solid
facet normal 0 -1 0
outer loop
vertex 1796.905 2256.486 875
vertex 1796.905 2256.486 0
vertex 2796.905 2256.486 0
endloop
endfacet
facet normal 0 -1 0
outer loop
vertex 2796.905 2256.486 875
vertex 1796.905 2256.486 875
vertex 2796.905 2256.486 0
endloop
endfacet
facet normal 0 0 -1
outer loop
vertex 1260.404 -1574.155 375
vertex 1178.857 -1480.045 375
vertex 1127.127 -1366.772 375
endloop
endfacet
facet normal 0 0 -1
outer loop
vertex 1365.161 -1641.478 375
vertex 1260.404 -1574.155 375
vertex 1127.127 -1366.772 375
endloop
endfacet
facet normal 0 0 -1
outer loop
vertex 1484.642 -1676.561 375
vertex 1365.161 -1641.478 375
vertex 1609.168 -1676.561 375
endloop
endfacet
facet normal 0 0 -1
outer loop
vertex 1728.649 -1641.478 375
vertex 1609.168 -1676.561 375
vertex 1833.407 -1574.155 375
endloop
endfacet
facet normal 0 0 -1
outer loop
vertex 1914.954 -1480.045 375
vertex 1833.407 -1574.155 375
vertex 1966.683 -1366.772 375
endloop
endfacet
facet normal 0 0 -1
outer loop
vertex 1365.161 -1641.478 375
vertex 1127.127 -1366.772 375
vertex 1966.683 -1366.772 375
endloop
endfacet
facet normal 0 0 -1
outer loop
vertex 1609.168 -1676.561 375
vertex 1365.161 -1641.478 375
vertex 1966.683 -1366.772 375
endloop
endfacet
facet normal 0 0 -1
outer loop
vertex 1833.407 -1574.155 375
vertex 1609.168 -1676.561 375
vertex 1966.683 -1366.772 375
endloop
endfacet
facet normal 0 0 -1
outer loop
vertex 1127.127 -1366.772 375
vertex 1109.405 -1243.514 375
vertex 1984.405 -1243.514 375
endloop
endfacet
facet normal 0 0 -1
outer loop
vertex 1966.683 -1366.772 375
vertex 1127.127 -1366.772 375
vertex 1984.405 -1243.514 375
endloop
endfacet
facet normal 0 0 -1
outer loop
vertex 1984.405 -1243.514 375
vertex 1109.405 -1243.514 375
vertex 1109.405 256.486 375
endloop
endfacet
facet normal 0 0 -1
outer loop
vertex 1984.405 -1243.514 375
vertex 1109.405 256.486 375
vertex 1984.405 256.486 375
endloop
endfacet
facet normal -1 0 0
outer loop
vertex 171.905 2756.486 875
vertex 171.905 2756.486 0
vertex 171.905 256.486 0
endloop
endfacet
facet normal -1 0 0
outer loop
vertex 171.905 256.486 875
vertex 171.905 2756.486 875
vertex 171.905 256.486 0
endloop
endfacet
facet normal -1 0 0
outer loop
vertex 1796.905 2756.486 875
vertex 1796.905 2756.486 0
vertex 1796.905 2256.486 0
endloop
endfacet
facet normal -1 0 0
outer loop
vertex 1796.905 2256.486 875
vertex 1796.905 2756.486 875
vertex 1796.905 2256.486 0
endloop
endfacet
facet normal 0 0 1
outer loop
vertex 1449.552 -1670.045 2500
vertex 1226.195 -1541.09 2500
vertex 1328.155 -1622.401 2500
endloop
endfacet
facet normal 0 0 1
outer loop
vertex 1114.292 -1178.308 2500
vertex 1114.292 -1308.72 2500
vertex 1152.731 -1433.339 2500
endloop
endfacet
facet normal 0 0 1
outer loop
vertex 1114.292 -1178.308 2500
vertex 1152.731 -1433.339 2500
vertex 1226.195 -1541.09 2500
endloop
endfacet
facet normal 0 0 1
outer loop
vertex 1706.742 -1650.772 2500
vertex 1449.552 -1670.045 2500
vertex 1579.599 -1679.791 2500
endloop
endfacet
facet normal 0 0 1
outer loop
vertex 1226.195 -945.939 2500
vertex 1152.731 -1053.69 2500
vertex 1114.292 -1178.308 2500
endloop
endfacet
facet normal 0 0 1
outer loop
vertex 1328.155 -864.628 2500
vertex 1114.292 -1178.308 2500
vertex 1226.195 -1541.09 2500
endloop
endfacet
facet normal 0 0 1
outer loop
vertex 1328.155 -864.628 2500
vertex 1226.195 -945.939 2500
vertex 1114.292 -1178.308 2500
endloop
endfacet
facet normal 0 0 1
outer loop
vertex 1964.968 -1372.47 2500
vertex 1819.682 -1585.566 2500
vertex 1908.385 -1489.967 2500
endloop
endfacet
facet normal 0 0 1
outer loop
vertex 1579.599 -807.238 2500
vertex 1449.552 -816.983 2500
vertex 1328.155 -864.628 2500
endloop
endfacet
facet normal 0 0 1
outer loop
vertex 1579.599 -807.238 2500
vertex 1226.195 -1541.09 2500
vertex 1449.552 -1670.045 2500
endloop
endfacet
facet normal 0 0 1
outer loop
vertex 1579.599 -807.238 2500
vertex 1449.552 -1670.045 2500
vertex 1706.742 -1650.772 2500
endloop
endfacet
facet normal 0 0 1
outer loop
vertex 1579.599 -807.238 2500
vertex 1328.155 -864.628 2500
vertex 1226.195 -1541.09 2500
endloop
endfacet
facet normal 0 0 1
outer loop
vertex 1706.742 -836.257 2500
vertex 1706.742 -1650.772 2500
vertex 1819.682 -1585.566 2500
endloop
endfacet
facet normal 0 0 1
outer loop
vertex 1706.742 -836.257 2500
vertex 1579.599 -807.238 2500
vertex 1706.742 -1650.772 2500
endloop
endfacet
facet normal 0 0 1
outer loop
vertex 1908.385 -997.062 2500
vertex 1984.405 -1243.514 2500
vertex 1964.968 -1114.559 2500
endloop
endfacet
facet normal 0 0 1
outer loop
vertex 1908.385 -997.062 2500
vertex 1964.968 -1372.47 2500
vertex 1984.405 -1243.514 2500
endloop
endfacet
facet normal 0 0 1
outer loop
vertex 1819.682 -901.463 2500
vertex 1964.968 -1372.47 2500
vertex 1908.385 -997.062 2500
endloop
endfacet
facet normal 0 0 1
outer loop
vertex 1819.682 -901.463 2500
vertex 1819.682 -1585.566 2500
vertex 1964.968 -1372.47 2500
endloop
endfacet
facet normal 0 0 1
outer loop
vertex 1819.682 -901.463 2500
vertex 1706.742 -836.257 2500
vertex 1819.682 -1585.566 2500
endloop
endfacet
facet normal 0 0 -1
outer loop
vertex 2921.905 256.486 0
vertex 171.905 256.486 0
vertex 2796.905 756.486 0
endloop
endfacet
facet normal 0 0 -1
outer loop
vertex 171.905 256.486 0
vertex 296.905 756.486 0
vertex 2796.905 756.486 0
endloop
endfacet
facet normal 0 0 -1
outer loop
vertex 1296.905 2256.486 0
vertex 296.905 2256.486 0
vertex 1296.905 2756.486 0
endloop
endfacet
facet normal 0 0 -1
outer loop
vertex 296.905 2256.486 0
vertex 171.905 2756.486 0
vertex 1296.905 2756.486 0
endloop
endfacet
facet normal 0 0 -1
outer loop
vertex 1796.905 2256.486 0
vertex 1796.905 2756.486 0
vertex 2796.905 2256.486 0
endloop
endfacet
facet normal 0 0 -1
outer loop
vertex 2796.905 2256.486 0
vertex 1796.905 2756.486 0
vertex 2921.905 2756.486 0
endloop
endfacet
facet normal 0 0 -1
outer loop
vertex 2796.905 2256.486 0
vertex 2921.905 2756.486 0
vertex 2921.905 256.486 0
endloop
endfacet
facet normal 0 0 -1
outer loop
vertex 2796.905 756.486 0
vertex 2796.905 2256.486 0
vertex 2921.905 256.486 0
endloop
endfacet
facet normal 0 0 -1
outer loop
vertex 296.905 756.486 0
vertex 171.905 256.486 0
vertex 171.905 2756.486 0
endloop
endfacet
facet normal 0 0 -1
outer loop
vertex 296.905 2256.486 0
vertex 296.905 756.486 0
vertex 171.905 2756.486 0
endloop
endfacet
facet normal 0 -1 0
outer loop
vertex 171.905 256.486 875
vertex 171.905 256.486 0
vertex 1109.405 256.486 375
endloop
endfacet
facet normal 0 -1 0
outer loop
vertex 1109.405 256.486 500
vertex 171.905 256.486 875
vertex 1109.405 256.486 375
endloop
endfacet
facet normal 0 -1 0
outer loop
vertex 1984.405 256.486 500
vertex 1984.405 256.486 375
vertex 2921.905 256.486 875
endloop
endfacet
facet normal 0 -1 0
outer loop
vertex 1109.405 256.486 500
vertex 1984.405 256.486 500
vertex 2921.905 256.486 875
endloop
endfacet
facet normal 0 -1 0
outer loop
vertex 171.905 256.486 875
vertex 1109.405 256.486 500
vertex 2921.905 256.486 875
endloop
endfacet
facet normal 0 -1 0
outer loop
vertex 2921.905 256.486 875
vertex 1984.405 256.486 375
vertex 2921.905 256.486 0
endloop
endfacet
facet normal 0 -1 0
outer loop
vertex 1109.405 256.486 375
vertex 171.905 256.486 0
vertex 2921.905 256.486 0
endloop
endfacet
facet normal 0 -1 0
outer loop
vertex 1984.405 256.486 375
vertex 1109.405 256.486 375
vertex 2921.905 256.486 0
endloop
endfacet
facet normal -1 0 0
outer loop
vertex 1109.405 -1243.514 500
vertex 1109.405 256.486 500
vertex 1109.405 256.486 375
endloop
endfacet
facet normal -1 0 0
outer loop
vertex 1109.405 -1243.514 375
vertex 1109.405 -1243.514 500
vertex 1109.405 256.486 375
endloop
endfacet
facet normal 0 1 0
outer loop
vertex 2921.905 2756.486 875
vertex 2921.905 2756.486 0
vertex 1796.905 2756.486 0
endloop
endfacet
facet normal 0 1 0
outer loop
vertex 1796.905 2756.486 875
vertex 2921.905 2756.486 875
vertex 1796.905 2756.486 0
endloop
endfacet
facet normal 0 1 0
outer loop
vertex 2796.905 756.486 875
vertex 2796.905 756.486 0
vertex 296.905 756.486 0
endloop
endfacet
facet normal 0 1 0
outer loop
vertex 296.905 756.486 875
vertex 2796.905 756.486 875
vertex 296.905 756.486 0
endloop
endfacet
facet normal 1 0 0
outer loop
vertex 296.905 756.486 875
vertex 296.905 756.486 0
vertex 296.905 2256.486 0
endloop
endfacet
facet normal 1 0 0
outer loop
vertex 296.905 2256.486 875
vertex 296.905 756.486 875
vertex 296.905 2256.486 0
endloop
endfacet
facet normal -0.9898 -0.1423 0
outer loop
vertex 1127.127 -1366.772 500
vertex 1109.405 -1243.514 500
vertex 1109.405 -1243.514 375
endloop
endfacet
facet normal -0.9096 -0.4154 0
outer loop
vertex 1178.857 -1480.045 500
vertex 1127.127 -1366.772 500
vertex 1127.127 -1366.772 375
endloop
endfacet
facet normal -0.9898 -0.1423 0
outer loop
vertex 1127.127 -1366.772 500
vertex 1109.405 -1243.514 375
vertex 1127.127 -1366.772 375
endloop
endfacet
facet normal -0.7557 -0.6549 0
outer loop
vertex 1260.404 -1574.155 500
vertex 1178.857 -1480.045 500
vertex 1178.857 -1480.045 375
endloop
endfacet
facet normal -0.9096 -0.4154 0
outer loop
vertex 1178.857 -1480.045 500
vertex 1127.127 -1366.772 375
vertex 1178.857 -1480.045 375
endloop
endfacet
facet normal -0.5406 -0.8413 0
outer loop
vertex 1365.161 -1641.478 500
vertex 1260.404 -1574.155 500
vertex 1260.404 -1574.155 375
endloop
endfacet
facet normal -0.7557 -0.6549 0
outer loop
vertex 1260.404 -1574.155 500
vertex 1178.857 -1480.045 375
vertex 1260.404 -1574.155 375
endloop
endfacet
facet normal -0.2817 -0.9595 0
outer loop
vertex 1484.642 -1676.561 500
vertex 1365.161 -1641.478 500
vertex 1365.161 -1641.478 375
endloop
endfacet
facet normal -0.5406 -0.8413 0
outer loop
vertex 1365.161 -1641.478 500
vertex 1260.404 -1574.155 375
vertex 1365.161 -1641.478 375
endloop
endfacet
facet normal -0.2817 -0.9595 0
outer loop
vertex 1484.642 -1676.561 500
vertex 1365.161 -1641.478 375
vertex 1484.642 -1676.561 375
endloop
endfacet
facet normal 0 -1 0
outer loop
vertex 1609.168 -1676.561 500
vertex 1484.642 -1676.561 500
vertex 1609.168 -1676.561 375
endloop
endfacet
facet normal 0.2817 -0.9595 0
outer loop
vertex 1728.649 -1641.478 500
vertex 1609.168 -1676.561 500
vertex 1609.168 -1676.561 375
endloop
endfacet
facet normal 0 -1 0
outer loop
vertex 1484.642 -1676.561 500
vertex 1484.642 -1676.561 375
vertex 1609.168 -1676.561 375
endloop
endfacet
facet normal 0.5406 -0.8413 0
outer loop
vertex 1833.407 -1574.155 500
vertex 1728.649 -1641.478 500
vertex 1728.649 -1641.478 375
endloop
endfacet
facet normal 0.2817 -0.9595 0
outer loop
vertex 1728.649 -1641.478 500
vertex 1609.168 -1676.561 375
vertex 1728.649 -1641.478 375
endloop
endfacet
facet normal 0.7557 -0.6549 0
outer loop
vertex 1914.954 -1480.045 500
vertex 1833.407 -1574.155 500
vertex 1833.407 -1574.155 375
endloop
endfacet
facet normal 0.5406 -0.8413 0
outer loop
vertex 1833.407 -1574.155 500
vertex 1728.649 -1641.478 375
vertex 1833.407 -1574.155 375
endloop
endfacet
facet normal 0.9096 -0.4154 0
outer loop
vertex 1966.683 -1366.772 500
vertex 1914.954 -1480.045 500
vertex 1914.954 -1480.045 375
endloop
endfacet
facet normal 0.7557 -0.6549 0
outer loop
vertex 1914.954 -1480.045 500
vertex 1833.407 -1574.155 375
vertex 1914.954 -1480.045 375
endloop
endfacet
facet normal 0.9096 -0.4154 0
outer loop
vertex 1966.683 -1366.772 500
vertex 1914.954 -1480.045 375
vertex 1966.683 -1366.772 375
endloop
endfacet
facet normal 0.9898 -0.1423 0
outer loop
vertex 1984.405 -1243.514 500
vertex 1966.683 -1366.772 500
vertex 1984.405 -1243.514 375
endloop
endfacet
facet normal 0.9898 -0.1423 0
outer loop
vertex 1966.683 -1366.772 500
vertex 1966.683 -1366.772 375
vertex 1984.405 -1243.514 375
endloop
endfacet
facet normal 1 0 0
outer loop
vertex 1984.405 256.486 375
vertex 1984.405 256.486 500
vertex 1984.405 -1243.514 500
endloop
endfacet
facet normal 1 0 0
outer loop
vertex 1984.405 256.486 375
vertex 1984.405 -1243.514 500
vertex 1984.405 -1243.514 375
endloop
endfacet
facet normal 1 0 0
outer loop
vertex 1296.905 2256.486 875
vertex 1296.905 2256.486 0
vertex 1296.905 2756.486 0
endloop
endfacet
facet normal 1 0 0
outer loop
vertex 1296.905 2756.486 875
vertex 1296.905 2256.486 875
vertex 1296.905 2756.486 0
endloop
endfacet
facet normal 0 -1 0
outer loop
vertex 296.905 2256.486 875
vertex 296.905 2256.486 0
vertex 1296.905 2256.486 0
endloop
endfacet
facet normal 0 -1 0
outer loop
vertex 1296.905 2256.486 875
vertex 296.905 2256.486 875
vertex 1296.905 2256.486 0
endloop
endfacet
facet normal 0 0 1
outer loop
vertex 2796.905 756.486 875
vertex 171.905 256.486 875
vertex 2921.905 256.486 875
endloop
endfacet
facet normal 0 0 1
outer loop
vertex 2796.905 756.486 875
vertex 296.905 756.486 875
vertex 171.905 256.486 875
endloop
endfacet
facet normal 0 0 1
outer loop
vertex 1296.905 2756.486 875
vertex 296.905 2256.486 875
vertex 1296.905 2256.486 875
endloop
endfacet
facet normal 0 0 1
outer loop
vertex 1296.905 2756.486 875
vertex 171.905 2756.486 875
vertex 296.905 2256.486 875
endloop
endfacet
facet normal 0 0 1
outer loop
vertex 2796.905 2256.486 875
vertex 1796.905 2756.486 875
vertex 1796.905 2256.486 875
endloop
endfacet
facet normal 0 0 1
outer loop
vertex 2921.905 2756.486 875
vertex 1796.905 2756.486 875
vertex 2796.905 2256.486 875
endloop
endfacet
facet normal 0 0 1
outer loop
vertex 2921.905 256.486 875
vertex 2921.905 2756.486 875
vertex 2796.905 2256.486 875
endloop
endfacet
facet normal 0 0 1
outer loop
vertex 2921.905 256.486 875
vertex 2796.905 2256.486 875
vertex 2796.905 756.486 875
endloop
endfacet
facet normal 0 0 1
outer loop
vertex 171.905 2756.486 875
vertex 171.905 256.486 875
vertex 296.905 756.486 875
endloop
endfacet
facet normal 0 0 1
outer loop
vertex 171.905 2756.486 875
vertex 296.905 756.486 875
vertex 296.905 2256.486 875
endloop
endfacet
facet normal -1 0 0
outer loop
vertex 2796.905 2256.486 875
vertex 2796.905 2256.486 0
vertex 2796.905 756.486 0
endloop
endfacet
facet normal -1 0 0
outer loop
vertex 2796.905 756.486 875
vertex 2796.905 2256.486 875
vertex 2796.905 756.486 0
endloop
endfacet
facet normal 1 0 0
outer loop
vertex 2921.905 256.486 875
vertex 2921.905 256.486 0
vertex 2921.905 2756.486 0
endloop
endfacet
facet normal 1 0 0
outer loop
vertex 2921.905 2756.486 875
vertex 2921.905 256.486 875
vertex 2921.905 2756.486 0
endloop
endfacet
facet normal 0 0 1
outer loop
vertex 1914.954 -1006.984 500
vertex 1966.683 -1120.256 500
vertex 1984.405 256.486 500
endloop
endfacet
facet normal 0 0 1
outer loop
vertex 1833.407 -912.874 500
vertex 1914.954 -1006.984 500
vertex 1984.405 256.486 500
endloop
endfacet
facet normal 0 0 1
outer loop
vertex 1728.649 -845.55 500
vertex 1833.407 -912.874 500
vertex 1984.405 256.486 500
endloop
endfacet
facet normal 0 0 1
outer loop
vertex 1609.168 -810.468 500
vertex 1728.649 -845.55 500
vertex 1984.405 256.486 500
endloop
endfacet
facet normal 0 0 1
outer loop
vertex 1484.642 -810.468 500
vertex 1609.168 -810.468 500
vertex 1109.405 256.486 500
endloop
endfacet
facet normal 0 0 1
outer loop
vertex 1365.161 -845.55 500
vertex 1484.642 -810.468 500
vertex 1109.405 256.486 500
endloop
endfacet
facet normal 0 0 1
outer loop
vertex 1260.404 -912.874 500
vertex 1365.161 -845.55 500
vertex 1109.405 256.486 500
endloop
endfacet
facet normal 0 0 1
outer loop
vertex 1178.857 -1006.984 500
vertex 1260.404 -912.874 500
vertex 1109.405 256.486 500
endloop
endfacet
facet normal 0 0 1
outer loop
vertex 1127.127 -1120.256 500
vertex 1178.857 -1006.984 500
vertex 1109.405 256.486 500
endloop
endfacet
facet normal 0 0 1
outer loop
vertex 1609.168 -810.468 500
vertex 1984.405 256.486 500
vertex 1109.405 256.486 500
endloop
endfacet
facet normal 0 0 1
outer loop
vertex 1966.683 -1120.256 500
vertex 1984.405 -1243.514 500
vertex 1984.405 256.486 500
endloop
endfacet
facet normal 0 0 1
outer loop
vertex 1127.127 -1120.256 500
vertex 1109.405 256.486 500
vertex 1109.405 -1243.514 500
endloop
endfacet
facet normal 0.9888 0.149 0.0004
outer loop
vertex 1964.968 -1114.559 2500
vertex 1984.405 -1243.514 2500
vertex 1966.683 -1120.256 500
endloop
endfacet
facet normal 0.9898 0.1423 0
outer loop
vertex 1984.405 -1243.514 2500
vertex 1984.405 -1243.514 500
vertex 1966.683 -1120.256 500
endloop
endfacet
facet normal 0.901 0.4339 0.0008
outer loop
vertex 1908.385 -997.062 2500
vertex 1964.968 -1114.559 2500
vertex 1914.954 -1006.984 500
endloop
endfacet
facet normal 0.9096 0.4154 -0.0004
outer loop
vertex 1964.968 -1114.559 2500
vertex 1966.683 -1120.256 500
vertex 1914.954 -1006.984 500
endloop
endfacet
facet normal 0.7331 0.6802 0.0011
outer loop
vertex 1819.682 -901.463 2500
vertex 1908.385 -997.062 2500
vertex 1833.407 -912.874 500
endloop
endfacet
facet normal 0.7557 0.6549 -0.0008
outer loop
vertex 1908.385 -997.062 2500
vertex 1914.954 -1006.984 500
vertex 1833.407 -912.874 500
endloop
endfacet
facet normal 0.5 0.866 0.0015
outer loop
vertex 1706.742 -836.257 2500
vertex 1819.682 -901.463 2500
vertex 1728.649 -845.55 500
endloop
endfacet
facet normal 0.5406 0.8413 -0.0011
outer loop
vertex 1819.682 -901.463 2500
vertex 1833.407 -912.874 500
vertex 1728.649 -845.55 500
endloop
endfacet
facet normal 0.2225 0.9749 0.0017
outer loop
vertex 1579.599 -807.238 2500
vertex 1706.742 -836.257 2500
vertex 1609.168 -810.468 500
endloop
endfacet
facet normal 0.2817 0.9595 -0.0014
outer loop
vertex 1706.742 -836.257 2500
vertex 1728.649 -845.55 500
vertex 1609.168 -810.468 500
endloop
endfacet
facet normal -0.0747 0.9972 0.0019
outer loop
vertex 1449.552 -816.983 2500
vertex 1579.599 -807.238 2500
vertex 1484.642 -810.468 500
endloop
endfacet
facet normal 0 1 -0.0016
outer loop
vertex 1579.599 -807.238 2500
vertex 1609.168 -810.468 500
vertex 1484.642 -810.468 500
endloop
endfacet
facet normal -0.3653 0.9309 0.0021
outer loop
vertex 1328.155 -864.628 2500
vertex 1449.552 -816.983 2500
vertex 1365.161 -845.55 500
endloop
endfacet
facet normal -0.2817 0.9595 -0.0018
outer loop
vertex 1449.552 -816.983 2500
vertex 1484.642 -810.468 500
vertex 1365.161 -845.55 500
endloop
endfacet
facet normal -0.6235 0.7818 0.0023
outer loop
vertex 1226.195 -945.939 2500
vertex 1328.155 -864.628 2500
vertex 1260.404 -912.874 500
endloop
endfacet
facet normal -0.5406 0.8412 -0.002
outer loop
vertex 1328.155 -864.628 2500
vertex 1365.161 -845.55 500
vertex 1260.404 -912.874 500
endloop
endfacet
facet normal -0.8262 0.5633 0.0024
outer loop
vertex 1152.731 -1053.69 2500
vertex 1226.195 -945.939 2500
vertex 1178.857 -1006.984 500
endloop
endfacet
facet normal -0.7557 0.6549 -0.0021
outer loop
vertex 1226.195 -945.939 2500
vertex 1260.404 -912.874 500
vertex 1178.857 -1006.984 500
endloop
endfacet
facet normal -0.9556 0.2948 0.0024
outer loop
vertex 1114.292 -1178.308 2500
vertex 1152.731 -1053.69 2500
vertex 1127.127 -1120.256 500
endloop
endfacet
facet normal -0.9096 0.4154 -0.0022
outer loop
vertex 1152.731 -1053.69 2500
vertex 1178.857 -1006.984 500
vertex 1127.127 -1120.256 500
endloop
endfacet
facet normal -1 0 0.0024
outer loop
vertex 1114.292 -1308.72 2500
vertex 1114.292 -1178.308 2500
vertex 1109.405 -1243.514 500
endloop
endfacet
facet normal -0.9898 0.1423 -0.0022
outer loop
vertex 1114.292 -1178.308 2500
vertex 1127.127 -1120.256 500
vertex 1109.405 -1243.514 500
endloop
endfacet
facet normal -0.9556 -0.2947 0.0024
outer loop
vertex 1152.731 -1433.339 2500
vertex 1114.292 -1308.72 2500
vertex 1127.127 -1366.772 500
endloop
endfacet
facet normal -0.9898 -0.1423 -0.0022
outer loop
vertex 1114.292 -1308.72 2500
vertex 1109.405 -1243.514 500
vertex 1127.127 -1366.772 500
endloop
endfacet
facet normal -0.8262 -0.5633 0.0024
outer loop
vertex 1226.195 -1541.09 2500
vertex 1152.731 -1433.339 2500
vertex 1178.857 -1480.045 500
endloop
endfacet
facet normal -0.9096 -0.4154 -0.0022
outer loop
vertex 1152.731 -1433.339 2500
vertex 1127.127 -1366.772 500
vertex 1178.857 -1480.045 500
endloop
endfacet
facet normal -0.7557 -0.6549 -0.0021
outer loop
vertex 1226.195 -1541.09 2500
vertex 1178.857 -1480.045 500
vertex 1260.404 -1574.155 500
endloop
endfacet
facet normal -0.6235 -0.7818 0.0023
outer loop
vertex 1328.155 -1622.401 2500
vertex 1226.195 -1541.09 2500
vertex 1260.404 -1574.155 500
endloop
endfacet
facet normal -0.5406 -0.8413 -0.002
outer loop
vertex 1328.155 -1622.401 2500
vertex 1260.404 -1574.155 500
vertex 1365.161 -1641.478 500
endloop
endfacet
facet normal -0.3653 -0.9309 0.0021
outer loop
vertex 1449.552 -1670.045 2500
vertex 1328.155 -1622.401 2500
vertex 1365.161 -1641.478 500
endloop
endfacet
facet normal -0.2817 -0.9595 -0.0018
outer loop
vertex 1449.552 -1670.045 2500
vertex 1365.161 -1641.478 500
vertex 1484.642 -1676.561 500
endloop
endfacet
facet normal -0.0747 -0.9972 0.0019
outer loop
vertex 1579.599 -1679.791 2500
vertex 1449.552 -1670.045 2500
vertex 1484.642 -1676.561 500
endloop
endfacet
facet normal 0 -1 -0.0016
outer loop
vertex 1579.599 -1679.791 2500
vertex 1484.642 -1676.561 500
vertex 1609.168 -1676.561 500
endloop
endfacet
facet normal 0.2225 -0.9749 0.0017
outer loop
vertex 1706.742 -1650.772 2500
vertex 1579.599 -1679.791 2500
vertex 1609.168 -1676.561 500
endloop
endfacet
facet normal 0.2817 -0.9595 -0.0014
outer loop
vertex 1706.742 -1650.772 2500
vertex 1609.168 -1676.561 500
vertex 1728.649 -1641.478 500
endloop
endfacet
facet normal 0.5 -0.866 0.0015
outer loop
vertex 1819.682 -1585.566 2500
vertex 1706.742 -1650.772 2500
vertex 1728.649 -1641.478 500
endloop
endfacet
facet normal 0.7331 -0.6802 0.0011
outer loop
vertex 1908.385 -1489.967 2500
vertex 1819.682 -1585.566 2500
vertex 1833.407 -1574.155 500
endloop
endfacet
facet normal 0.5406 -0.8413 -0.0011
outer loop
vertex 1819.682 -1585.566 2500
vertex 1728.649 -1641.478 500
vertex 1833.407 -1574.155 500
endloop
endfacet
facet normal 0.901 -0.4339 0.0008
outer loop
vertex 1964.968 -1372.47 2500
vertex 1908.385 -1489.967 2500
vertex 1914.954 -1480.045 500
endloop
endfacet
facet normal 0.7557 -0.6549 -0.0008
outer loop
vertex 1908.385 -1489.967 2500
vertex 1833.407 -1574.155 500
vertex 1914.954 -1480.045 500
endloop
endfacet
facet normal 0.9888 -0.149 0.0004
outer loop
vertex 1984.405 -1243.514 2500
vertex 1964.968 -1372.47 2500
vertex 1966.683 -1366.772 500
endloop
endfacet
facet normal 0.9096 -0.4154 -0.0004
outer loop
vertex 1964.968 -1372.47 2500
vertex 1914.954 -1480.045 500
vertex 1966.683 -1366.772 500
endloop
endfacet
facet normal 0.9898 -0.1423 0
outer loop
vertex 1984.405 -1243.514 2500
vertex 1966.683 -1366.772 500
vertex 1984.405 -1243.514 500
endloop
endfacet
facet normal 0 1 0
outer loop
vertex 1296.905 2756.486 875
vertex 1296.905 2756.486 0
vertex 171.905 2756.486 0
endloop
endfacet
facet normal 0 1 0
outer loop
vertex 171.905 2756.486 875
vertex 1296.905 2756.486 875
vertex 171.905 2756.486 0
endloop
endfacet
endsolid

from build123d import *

# Parameters (mm, degrees)
BOSS_EXTRUDE1_DEPTH = 875
SKETCH2_W           = 875
SKETCH2_H           = 125
BOSS_EXTRUDE2_DEPTH = 1500
SKETCH3_R           = 437.5
BOSS_EXTRUDE3_DEPTH = 2000
BOSS_EXTRUDE4_START = 125
BOSS_EXTRUDE4_DEPTH = 125


with BuildPart() as part:
    # Sketch1 → Boss-Extrude1 (new body)
    with BuildSketch(Plane.XY):
        Polygon((171.90508229, 256.485559069), (2921.90508229, 256.485559069), (2921.90508229, 2756.485559069), (1796.90508229, 2756.485559069), (1796.90508229, 2256.485559069), (2796.90508229, 2256.485559069), (2796.90508229, 756.485559069), (296.90508229, 756.485559069), (296.90508229, 2256.485559069), (1296.90508229, 2256.485559069), (1296.90508229, 2756.485559069), (171.90508229, 2756.485559069), align=None)
    extrude(amount=BOSS_EXTRUDE1_DEPTH)

    # Sketch2 → Boss-Extrude2 (add)
    with BuildSketch(Plane(origin=(0, 256.485559069, 0), x_dir=(-1, 0, 0), z_dir=(0, -1, 0))):
        with Locations((-1546.90508229, -437.5)):
            Rectangle(SKETCH2_W, SKETCH2_H)
    extrude(amount=BOSS_EXTRUDE2_DEPTH)

    # Sketch3 → Boss-Extrude3 (add)
    with BuildSketch(Plane.XY.offset(500)):
        with Locations((1546.90508229, -1243.514440931)):
            Circle(SKETCH3_R)
    extrude(amount=BOSS_EXTRUDE3_DEPTH)

    # Sketch4 → Boss-Extrude4 (add)
    with BuildSketch(Plane(origin=(0, 0, 500), x_dir=(-1, 0, 0), z_dir=(0, 0, -1)).offset(BOSS_EXTRUDE4_START)):
        with BuildLine():
            Line((-1984.40508229, -1243.514440931), (-1109.40508229, -1243.514440931))
            ThreePointArc((-1109.40508229, -1243.514440931), (-1546.90508229, -1681.014440931), (-1984.40508229, -1243.514440931))
        make_face()
    extrude(amount=-BOSS_EXTRUDE4_DEPTH)


solid = part.part
